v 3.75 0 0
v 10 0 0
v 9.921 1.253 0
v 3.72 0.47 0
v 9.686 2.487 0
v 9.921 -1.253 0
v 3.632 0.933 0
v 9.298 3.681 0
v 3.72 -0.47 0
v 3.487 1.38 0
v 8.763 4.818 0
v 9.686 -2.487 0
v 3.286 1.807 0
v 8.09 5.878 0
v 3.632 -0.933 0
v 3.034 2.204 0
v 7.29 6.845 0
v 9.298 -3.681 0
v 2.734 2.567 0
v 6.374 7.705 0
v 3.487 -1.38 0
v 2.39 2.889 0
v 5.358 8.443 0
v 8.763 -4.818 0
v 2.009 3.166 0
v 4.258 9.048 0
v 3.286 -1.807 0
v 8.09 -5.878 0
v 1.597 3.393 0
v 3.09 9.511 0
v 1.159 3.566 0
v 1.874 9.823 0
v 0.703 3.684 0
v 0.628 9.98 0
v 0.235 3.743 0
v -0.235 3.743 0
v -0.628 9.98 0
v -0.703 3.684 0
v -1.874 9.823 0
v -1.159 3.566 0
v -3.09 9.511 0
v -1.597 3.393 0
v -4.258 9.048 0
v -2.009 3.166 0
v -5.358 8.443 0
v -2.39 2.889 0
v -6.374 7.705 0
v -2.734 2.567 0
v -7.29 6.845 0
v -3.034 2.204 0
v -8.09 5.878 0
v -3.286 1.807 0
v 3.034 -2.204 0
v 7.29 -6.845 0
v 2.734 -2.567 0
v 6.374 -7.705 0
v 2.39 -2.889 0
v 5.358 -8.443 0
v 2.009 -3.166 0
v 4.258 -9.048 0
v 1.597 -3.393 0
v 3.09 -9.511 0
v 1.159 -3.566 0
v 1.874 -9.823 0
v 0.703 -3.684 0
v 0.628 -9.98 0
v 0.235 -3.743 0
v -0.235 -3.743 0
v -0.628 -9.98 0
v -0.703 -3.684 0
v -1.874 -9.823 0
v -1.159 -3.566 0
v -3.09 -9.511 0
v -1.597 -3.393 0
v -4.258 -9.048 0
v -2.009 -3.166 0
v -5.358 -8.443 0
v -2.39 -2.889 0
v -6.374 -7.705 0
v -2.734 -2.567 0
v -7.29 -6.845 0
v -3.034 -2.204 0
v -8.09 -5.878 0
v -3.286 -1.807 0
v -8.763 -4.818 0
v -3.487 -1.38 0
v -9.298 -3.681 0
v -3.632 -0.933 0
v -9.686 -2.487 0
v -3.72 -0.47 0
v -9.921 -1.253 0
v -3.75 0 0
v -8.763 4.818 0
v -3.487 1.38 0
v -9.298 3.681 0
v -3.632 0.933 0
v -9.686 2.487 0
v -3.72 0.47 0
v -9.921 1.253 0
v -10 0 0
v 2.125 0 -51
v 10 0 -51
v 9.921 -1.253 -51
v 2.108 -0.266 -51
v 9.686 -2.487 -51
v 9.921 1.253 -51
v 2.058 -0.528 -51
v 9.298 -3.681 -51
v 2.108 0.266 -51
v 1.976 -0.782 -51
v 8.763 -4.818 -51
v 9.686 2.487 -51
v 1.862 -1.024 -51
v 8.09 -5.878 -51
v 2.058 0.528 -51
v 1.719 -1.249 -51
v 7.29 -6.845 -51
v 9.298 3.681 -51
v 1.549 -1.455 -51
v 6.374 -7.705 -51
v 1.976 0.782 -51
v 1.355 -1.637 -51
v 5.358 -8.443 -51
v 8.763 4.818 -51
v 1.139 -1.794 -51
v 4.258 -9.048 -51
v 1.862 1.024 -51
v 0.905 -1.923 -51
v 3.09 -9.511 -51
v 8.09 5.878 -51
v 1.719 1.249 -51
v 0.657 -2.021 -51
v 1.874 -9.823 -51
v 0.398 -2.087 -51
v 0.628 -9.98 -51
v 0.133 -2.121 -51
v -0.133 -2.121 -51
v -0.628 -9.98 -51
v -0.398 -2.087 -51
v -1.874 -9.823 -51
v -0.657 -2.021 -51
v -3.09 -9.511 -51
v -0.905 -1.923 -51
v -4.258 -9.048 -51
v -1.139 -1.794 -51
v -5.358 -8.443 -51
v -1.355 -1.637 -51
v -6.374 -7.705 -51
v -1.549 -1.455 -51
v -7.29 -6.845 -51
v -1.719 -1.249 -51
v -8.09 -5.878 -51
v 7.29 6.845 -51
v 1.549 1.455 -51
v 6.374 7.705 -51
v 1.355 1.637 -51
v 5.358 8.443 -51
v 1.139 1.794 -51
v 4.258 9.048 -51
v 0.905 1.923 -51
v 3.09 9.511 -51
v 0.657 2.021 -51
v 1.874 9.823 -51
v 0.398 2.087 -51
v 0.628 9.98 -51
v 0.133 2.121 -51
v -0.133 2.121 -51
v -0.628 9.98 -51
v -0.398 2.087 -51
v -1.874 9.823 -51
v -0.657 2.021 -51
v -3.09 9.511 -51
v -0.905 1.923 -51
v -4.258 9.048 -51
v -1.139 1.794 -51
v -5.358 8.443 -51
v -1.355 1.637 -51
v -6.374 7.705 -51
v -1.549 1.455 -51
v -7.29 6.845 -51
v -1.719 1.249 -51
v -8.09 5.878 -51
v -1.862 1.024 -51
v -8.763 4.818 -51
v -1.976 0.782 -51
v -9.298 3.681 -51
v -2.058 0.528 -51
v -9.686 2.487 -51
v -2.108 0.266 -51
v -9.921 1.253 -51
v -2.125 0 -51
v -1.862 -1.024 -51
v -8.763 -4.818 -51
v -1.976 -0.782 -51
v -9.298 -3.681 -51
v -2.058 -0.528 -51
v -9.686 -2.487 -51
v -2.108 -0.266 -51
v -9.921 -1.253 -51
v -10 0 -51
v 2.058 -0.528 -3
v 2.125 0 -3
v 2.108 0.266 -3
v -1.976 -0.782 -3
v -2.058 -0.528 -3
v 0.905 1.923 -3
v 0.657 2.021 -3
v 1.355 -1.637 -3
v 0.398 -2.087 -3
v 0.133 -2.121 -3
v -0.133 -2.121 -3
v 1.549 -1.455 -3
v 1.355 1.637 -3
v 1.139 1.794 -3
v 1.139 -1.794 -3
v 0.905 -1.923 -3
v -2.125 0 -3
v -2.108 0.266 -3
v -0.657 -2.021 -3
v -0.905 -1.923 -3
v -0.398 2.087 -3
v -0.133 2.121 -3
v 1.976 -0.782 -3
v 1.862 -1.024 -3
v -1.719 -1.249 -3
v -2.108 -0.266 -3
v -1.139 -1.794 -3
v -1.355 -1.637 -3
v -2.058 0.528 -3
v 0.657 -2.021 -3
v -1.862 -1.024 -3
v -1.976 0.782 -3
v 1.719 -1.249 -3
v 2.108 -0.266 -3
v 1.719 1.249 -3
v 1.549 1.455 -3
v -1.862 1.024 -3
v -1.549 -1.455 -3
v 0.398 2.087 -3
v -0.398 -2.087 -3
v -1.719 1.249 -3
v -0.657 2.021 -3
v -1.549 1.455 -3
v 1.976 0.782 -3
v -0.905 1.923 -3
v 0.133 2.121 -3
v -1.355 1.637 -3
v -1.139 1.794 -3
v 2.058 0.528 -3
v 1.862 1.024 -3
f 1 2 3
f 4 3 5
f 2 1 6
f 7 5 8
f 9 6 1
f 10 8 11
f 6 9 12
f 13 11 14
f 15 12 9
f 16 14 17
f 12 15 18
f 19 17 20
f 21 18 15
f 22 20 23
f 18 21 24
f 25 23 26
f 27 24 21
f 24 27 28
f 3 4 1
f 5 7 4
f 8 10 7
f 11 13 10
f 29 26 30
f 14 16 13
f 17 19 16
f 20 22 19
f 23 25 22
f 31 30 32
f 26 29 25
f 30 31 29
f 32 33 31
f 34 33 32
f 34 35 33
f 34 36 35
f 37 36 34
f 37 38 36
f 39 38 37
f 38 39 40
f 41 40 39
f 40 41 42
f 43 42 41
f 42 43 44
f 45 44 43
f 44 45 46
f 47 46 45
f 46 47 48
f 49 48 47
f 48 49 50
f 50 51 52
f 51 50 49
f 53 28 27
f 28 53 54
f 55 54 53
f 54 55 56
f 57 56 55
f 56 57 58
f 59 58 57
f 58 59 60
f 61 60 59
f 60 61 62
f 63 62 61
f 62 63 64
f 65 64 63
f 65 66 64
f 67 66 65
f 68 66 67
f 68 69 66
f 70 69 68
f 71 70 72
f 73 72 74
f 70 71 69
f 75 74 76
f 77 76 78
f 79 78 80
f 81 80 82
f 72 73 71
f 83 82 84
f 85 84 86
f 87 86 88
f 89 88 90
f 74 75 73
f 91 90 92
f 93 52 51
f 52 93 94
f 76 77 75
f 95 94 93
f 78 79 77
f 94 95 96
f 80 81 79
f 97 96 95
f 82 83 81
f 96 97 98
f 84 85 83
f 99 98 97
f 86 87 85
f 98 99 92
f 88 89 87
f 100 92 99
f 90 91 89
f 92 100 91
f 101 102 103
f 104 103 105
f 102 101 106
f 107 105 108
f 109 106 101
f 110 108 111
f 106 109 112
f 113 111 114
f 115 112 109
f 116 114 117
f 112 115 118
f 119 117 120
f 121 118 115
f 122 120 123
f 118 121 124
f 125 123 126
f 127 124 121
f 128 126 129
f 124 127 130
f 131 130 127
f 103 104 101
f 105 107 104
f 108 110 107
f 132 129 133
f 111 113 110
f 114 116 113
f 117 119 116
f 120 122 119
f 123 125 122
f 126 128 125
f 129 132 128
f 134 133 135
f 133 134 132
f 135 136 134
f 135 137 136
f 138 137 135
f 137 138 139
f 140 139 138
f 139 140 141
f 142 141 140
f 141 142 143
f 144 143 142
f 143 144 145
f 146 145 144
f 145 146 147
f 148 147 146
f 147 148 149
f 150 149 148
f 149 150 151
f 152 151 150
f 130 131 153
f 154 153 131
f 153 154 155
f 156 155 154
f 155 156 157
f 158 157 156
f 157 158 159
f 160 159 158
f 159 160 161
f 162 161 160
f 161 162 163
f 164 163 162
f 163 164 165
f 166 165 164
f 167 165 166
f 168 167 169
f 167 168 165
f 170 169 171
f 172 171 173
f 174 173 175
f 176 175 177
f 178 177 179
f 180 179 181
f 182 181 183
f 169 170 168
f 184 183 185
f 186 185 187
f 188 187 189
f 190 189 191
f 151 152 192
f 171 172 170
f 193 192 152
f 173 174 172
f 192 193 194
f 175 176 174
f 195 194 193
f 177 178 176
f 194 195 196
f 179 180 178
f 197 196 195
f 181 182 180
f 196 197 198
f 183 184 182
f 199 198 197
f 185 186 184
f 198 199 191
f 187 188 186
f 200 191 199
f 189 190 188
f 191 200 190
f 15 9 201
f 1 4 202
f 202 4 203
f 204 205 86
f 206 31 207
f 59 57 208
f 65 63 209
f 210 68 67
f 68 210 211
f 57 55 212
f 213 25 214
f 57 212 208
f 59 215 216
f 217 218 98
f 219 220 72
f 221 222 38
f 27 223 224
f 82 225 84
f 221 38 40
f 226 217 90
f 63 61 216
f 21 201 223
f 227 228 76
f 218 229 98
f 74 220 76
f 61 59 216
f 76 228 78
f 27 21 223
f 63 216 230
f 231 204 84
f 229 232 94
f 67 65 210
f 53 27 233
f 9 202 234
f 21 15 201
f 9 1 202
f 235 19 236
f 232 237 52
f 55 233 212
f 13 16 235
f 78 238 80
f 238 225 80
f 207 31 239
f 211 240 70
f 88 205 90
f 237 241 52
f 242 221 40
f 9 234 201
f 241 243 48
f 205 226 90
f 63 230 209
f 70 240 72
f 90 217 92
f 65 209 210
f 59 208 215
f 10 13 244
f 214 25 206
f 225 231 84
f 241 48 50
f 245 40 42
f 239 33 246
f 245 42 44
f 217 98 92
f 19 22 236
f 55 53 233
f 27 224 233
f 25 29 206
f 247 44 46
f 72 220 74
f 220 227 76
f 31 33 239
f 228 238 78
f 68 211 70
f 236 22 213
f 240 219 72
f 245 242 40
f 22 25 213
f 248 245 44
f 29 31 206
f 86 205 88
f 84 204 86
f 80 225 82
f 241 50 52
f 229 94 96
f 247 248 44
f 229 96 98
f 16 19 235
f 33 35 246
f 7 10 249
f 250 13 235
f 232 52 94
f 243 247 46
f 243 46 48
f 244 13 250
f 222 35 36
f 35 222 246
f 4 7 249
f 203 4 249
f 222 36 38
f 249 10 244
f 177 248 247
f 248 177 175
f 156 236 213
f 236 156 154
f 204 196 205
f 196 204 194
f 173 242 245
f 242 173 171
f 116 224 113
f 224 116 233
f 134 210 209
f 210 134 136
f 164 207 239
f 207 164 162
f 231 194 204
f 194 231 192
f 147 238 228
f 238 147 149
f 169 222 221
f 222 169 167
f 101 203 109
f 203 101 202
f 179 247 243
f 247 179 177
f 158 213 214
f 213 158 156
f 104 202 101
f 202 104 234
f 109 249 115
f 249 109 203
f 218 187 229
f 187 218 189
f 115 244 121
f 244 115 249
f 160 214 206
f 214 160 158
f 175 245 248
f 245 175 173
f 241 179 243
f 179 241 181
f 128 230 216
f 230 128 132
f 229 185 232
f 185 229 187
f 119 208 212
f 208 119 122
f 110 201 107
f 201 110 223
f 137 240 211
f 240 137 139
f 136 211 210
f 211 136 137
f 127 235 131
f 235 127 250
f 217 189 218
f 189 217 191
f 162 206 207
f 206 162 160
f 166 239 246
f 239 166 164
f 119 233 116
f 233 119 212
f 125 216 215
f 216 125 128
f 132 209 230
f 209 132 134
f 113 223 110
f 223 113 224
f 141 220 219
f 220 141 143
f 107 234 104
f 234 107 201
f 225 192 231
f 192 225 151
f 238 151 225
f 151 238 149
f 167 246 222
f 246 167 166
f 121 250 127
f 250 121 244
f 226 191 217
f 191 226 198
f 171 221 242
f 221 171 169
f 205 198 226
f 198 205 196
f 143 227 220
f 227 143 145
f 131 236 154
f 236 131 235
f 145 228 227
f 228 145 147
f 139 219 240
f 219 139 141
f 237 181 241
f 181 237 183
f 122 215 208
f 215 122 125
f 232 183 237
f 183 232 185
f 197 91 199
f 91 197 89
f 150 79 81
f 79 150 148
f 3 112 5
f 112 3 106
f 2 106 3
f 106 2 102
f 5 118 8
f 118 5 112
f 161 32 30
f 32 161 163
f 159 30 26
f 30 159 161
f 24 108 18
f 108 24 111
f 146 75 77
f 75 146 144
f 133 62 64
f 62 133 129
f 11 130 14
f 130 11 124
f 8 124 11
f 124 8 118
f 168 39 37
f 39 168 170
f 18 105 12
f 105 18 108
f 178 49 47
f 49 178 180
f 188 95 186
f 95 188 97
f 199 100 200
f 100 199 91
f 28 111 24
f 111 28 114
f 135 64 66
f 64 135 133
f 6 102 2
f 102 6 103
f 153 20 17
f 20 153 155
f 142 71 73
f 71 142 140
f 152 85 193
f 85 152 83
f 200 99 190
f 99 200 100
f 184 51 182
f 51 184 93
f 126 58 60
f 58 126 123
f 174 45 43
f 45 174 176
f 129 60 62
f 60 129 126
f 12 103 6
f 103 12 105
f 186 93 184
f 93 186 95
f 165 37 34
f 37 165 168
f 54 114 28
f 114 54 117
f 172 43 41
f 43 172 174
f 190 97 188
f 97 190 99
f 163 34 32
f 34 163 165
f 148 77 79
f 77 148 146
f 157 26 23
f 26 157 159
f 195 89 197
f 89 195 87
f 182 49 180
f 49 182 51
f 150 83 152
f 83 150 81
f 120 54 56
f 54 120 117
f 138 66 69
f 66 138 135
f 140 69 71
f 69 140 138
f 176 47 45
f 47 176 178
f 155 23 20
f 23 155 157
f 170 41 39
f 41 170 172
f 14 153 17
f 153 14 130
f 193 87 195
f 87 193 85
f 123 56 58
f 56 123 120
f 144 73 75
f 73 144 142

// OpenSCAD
$fn = 50;


difference() {
	union() {
		translate(v = [0, 0, -51.0000000000]) {
			cylinder(h = 51, r = 10.0000000000);
		}
		cylinder(h = 0, r = 13.0000000000);
	}
	union() {
		translate(v = [0, 0, 0]) {
			rotate(a = [0, 0, 0]) {
				difference() {
					union() {
						#translate(v = [0, 0, -51.0000000000]) {
							cylinder(h = 51, r = 2.0000000000);
						}
						#translate(v = [0, 0, -3]) {
							cylinder(h = 3, r = 10.0000000000, r1 = 2.1250000000, r2 = 3.7500000000);
						}
						#translate(v = [0, 0, -51.0000000000]) {
							cylinder(h = 51, r = 2.1250000000);
						}
						#translate(v = [0, 0, -51.0000000000]) {
							cylinder(h = 51, r = 2.0000000000);
						}
					}
					union();
				}
			}
		}
	}
}
